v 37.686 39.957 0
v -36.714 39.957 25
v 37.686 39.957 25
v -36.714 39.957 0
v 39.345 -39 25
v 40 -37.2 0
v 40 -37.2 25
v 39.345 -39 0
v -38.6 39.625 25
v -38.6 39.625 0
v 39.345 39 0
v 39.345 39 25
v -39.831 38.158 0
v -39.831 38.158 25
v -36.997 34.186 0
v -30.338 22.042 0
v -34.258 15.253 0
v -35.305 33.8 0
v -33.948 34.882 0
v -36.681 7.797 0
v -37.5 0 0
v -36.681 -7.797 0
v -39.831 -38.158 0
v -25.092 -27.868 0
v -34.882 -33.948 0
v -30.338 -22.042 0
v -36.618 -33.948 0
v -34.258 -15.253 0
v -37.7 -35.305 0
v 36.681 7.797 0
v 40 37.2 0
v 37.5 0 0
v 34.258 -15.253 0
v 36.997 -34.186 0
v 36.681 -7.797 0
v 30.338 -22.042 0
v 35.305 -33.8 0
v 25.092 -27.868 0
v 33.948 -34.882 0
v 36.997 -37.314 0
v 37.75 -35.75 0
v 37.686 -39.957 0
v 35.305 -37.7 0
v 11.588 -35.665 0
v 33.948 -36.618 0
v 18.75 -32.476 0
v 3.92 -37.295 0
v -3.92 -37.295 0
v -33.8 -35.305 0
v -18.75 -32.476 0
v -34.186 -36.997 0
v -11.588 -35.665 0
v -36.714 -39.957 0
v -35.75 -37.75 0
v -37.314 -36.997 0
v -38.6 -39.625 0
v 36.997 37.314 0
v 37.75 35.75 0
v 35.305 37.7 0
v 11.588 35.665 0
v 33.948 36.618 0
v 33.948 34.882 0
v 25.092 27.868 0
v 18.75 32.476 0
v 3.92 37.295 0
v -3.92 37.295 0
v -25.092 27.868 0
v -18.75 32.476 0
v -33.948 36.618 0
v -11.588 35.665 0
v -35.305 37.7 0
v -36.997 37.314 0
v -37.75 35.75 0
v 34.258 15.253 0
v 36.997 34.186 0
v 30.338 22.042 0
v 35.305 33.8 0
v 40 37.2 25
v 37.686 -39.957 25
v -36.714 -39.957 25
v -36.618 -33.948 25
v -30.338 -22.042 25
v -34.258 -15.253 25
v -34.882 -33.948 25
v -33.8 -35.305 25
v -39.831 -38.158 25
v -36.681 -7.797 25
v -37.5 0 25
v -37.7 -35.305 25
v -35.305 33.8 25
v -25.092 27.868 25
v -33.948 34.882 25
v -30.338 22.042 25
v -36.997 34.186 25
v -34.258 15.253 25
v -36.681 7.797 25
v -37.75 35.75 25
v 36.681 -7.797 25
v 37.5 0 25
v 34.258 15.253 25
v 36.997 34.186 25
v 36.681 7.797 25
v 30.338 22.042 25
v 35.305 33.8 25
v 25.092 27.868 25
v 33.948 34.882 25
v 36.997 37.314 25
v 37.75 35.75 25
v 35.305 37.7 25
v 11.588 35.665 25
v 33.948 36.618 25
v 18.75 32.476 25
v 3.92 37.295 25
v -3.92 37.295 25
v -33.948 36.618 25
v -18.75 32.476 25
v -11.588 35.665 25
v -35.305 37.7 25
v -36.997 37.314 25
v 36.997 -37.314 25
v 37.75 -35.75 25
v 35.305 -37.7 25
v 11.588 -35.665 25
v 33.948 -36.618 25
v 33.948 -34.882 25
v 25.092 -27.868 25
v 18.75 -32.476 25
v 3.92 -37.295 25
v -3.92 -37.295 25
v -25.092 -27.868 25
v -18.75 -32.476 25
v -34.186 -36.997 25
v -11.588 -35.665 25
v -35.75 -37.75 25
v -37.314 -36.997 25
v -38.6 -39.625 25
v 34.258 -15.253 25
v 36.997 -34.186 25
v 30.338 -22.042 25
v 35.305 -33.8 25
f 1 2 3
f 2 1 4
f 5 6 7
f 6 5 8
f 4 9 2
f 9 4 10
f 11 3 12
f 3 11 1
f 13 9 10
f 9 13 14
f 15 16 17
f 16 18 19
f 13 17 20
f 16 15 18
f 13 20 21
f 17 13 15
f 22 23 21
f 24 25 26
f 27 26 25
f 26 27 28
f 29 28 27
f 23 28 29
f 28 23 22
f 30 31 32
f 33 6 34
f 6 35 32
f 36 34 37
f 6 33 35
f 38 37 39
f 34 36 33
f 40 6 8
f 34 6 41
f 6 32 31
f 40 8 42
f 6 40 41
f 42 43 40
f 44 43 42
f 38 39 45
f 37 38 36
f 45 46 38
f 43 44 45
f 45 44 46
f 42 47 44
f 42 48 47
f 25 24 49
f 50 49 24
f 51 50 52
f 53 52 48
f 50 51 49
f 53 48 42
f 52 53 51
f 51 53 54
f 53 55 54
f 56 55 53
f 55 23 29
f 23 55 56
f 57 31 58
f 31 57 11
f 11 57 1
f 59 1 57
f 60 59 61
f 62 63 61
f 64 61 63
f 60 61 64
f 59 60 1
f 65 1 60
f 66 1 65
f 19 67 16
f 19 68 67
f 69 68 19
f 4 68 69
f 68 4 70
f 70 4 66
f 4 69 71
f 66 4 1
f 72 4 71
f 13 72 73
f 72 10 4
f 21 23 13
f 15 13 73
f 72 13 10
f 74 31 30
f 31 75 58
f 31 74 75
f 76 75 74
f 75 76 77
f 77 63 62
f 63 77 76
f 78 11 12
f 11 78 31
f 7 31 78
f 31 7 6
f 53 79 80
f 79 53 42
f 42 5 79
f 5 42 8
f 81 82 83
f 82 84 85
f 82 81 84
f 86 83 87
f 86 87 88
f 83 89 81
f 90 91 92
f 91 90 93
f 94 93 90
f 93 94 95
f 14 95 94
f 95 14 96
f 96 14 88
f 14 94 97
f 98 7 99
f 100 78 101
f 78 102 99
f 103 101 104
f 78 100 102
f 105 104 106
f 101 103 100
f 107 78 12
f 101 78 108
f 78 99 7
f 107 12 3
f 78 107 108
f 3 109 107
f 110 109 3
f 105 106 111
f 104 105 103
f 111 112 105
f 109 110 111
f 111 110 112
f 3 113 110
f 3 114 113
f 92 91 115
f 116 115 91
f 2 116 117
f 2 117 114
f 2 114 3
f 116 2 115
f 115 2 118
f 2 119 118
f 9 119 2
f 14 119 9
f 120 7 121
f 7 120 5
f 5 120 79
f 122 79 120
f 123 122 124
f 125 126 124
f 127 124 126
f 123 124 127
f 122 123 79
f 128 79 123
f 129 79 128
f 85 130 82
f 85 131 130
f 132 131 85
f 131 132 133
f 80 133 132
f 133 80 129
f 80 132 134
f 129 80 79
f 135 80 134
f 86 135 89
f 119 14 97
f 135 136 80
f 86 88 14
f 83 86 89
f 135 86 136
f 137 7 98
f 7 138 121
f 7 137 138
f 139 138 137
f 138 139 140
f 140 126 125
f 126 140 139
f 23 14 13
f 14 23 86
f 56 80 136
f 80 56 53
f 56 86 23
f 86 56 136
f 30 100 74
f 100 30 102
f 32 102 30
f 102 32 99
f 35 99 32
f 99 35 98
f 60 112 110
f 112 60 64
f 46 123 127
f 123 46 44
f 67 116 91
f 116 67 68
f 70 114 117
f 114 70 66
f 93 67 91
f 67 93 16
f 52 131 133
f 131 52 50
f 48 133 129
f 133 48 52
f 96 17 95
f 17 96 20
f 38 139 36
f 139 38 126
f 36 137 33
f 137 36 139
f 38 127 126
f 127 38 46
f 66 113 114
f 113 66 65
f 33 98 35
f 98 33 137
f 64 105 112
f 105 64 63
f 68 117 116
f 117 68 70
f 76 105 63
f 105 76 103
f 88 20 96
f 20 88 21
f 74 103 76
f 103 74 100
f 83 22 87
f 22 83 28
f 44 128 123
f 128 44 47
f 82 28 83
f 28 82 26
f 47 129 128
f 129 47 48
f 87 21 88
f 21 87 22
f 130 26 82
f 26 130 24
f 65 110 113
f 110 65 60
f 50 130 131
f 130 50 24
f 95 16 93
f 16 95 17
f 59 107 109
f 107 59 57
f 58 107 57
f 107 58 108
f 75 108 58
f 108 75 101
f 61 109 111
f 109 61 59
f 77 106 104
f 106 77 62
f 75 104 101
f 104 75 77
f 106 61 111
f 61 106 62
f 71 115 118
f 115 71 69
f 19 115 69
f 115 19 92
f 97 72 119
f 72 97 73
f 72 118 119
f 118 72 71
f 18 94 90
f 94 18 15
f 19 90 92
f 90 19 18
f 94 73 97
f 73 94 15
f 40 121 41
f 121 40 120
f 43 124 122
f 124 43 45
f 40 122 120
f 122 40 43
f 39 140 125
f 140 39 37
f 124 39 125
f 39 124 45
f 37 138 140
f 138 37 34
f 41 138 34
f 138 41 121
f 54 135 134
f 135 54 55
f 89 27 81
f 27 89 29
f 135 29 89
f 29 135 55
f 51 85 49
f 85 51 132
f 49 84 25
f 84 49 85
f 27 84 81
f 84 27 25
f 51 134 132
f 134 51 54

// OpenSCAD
module fan_80mm() {
    color("DarkSlateGray")difference() {
        // main body
        translate([-40,-40,0]) {
            hull() {
                translate([2.8,2.8,0])cylinder(h=25, r=2.8);
                translate([80-2.8,2.8,0])cylinder(h=25, r=2.8);
                translate([2.8,80-2.8,0])cylinder(h=25, r=2.8);
                translate([80-2.8,80-2.8,0])cylinder(h=25, r=2.8);
            }
        }

        // fan hole
        translate([0,0,-1])cylinder(h=25+2, d=75);

        // mount holes
        translate([71.5/2,71.5/2,-1])cylinder(h=25+2, d=4);
        mirror([1,0,0])translate([71.5/2,71.5/2,-1])cylinder(h=25+2, d=4);
        mirror([0,1,0])translate([71.5/2,71.5/2,-1])cylinder(h=25+2, d=4);
        mirror([1,1,0])translate([71.5/2,71.5/2,-1])cylinder(h=25+2, d=4);
    }
}

module fancut_80mm(depth) {
    cylinder(h=depth, d=78);
    translate([71.5/2,71.5/2,0])cylinder(h=depth, d=4);
    mirror([1,0,0])translate([71.5/2,71.5/2,0])cylinder(h=depth, d=5);
    mirror([0,1,0])translate([71.5/2,71.5/2,0])cylinder(h=depth, d=5);
    mirror([1,1,0])translate([71.5/2,71.5/2,0])cylinder(h=depth, d=5);
}

fan_80mm();
